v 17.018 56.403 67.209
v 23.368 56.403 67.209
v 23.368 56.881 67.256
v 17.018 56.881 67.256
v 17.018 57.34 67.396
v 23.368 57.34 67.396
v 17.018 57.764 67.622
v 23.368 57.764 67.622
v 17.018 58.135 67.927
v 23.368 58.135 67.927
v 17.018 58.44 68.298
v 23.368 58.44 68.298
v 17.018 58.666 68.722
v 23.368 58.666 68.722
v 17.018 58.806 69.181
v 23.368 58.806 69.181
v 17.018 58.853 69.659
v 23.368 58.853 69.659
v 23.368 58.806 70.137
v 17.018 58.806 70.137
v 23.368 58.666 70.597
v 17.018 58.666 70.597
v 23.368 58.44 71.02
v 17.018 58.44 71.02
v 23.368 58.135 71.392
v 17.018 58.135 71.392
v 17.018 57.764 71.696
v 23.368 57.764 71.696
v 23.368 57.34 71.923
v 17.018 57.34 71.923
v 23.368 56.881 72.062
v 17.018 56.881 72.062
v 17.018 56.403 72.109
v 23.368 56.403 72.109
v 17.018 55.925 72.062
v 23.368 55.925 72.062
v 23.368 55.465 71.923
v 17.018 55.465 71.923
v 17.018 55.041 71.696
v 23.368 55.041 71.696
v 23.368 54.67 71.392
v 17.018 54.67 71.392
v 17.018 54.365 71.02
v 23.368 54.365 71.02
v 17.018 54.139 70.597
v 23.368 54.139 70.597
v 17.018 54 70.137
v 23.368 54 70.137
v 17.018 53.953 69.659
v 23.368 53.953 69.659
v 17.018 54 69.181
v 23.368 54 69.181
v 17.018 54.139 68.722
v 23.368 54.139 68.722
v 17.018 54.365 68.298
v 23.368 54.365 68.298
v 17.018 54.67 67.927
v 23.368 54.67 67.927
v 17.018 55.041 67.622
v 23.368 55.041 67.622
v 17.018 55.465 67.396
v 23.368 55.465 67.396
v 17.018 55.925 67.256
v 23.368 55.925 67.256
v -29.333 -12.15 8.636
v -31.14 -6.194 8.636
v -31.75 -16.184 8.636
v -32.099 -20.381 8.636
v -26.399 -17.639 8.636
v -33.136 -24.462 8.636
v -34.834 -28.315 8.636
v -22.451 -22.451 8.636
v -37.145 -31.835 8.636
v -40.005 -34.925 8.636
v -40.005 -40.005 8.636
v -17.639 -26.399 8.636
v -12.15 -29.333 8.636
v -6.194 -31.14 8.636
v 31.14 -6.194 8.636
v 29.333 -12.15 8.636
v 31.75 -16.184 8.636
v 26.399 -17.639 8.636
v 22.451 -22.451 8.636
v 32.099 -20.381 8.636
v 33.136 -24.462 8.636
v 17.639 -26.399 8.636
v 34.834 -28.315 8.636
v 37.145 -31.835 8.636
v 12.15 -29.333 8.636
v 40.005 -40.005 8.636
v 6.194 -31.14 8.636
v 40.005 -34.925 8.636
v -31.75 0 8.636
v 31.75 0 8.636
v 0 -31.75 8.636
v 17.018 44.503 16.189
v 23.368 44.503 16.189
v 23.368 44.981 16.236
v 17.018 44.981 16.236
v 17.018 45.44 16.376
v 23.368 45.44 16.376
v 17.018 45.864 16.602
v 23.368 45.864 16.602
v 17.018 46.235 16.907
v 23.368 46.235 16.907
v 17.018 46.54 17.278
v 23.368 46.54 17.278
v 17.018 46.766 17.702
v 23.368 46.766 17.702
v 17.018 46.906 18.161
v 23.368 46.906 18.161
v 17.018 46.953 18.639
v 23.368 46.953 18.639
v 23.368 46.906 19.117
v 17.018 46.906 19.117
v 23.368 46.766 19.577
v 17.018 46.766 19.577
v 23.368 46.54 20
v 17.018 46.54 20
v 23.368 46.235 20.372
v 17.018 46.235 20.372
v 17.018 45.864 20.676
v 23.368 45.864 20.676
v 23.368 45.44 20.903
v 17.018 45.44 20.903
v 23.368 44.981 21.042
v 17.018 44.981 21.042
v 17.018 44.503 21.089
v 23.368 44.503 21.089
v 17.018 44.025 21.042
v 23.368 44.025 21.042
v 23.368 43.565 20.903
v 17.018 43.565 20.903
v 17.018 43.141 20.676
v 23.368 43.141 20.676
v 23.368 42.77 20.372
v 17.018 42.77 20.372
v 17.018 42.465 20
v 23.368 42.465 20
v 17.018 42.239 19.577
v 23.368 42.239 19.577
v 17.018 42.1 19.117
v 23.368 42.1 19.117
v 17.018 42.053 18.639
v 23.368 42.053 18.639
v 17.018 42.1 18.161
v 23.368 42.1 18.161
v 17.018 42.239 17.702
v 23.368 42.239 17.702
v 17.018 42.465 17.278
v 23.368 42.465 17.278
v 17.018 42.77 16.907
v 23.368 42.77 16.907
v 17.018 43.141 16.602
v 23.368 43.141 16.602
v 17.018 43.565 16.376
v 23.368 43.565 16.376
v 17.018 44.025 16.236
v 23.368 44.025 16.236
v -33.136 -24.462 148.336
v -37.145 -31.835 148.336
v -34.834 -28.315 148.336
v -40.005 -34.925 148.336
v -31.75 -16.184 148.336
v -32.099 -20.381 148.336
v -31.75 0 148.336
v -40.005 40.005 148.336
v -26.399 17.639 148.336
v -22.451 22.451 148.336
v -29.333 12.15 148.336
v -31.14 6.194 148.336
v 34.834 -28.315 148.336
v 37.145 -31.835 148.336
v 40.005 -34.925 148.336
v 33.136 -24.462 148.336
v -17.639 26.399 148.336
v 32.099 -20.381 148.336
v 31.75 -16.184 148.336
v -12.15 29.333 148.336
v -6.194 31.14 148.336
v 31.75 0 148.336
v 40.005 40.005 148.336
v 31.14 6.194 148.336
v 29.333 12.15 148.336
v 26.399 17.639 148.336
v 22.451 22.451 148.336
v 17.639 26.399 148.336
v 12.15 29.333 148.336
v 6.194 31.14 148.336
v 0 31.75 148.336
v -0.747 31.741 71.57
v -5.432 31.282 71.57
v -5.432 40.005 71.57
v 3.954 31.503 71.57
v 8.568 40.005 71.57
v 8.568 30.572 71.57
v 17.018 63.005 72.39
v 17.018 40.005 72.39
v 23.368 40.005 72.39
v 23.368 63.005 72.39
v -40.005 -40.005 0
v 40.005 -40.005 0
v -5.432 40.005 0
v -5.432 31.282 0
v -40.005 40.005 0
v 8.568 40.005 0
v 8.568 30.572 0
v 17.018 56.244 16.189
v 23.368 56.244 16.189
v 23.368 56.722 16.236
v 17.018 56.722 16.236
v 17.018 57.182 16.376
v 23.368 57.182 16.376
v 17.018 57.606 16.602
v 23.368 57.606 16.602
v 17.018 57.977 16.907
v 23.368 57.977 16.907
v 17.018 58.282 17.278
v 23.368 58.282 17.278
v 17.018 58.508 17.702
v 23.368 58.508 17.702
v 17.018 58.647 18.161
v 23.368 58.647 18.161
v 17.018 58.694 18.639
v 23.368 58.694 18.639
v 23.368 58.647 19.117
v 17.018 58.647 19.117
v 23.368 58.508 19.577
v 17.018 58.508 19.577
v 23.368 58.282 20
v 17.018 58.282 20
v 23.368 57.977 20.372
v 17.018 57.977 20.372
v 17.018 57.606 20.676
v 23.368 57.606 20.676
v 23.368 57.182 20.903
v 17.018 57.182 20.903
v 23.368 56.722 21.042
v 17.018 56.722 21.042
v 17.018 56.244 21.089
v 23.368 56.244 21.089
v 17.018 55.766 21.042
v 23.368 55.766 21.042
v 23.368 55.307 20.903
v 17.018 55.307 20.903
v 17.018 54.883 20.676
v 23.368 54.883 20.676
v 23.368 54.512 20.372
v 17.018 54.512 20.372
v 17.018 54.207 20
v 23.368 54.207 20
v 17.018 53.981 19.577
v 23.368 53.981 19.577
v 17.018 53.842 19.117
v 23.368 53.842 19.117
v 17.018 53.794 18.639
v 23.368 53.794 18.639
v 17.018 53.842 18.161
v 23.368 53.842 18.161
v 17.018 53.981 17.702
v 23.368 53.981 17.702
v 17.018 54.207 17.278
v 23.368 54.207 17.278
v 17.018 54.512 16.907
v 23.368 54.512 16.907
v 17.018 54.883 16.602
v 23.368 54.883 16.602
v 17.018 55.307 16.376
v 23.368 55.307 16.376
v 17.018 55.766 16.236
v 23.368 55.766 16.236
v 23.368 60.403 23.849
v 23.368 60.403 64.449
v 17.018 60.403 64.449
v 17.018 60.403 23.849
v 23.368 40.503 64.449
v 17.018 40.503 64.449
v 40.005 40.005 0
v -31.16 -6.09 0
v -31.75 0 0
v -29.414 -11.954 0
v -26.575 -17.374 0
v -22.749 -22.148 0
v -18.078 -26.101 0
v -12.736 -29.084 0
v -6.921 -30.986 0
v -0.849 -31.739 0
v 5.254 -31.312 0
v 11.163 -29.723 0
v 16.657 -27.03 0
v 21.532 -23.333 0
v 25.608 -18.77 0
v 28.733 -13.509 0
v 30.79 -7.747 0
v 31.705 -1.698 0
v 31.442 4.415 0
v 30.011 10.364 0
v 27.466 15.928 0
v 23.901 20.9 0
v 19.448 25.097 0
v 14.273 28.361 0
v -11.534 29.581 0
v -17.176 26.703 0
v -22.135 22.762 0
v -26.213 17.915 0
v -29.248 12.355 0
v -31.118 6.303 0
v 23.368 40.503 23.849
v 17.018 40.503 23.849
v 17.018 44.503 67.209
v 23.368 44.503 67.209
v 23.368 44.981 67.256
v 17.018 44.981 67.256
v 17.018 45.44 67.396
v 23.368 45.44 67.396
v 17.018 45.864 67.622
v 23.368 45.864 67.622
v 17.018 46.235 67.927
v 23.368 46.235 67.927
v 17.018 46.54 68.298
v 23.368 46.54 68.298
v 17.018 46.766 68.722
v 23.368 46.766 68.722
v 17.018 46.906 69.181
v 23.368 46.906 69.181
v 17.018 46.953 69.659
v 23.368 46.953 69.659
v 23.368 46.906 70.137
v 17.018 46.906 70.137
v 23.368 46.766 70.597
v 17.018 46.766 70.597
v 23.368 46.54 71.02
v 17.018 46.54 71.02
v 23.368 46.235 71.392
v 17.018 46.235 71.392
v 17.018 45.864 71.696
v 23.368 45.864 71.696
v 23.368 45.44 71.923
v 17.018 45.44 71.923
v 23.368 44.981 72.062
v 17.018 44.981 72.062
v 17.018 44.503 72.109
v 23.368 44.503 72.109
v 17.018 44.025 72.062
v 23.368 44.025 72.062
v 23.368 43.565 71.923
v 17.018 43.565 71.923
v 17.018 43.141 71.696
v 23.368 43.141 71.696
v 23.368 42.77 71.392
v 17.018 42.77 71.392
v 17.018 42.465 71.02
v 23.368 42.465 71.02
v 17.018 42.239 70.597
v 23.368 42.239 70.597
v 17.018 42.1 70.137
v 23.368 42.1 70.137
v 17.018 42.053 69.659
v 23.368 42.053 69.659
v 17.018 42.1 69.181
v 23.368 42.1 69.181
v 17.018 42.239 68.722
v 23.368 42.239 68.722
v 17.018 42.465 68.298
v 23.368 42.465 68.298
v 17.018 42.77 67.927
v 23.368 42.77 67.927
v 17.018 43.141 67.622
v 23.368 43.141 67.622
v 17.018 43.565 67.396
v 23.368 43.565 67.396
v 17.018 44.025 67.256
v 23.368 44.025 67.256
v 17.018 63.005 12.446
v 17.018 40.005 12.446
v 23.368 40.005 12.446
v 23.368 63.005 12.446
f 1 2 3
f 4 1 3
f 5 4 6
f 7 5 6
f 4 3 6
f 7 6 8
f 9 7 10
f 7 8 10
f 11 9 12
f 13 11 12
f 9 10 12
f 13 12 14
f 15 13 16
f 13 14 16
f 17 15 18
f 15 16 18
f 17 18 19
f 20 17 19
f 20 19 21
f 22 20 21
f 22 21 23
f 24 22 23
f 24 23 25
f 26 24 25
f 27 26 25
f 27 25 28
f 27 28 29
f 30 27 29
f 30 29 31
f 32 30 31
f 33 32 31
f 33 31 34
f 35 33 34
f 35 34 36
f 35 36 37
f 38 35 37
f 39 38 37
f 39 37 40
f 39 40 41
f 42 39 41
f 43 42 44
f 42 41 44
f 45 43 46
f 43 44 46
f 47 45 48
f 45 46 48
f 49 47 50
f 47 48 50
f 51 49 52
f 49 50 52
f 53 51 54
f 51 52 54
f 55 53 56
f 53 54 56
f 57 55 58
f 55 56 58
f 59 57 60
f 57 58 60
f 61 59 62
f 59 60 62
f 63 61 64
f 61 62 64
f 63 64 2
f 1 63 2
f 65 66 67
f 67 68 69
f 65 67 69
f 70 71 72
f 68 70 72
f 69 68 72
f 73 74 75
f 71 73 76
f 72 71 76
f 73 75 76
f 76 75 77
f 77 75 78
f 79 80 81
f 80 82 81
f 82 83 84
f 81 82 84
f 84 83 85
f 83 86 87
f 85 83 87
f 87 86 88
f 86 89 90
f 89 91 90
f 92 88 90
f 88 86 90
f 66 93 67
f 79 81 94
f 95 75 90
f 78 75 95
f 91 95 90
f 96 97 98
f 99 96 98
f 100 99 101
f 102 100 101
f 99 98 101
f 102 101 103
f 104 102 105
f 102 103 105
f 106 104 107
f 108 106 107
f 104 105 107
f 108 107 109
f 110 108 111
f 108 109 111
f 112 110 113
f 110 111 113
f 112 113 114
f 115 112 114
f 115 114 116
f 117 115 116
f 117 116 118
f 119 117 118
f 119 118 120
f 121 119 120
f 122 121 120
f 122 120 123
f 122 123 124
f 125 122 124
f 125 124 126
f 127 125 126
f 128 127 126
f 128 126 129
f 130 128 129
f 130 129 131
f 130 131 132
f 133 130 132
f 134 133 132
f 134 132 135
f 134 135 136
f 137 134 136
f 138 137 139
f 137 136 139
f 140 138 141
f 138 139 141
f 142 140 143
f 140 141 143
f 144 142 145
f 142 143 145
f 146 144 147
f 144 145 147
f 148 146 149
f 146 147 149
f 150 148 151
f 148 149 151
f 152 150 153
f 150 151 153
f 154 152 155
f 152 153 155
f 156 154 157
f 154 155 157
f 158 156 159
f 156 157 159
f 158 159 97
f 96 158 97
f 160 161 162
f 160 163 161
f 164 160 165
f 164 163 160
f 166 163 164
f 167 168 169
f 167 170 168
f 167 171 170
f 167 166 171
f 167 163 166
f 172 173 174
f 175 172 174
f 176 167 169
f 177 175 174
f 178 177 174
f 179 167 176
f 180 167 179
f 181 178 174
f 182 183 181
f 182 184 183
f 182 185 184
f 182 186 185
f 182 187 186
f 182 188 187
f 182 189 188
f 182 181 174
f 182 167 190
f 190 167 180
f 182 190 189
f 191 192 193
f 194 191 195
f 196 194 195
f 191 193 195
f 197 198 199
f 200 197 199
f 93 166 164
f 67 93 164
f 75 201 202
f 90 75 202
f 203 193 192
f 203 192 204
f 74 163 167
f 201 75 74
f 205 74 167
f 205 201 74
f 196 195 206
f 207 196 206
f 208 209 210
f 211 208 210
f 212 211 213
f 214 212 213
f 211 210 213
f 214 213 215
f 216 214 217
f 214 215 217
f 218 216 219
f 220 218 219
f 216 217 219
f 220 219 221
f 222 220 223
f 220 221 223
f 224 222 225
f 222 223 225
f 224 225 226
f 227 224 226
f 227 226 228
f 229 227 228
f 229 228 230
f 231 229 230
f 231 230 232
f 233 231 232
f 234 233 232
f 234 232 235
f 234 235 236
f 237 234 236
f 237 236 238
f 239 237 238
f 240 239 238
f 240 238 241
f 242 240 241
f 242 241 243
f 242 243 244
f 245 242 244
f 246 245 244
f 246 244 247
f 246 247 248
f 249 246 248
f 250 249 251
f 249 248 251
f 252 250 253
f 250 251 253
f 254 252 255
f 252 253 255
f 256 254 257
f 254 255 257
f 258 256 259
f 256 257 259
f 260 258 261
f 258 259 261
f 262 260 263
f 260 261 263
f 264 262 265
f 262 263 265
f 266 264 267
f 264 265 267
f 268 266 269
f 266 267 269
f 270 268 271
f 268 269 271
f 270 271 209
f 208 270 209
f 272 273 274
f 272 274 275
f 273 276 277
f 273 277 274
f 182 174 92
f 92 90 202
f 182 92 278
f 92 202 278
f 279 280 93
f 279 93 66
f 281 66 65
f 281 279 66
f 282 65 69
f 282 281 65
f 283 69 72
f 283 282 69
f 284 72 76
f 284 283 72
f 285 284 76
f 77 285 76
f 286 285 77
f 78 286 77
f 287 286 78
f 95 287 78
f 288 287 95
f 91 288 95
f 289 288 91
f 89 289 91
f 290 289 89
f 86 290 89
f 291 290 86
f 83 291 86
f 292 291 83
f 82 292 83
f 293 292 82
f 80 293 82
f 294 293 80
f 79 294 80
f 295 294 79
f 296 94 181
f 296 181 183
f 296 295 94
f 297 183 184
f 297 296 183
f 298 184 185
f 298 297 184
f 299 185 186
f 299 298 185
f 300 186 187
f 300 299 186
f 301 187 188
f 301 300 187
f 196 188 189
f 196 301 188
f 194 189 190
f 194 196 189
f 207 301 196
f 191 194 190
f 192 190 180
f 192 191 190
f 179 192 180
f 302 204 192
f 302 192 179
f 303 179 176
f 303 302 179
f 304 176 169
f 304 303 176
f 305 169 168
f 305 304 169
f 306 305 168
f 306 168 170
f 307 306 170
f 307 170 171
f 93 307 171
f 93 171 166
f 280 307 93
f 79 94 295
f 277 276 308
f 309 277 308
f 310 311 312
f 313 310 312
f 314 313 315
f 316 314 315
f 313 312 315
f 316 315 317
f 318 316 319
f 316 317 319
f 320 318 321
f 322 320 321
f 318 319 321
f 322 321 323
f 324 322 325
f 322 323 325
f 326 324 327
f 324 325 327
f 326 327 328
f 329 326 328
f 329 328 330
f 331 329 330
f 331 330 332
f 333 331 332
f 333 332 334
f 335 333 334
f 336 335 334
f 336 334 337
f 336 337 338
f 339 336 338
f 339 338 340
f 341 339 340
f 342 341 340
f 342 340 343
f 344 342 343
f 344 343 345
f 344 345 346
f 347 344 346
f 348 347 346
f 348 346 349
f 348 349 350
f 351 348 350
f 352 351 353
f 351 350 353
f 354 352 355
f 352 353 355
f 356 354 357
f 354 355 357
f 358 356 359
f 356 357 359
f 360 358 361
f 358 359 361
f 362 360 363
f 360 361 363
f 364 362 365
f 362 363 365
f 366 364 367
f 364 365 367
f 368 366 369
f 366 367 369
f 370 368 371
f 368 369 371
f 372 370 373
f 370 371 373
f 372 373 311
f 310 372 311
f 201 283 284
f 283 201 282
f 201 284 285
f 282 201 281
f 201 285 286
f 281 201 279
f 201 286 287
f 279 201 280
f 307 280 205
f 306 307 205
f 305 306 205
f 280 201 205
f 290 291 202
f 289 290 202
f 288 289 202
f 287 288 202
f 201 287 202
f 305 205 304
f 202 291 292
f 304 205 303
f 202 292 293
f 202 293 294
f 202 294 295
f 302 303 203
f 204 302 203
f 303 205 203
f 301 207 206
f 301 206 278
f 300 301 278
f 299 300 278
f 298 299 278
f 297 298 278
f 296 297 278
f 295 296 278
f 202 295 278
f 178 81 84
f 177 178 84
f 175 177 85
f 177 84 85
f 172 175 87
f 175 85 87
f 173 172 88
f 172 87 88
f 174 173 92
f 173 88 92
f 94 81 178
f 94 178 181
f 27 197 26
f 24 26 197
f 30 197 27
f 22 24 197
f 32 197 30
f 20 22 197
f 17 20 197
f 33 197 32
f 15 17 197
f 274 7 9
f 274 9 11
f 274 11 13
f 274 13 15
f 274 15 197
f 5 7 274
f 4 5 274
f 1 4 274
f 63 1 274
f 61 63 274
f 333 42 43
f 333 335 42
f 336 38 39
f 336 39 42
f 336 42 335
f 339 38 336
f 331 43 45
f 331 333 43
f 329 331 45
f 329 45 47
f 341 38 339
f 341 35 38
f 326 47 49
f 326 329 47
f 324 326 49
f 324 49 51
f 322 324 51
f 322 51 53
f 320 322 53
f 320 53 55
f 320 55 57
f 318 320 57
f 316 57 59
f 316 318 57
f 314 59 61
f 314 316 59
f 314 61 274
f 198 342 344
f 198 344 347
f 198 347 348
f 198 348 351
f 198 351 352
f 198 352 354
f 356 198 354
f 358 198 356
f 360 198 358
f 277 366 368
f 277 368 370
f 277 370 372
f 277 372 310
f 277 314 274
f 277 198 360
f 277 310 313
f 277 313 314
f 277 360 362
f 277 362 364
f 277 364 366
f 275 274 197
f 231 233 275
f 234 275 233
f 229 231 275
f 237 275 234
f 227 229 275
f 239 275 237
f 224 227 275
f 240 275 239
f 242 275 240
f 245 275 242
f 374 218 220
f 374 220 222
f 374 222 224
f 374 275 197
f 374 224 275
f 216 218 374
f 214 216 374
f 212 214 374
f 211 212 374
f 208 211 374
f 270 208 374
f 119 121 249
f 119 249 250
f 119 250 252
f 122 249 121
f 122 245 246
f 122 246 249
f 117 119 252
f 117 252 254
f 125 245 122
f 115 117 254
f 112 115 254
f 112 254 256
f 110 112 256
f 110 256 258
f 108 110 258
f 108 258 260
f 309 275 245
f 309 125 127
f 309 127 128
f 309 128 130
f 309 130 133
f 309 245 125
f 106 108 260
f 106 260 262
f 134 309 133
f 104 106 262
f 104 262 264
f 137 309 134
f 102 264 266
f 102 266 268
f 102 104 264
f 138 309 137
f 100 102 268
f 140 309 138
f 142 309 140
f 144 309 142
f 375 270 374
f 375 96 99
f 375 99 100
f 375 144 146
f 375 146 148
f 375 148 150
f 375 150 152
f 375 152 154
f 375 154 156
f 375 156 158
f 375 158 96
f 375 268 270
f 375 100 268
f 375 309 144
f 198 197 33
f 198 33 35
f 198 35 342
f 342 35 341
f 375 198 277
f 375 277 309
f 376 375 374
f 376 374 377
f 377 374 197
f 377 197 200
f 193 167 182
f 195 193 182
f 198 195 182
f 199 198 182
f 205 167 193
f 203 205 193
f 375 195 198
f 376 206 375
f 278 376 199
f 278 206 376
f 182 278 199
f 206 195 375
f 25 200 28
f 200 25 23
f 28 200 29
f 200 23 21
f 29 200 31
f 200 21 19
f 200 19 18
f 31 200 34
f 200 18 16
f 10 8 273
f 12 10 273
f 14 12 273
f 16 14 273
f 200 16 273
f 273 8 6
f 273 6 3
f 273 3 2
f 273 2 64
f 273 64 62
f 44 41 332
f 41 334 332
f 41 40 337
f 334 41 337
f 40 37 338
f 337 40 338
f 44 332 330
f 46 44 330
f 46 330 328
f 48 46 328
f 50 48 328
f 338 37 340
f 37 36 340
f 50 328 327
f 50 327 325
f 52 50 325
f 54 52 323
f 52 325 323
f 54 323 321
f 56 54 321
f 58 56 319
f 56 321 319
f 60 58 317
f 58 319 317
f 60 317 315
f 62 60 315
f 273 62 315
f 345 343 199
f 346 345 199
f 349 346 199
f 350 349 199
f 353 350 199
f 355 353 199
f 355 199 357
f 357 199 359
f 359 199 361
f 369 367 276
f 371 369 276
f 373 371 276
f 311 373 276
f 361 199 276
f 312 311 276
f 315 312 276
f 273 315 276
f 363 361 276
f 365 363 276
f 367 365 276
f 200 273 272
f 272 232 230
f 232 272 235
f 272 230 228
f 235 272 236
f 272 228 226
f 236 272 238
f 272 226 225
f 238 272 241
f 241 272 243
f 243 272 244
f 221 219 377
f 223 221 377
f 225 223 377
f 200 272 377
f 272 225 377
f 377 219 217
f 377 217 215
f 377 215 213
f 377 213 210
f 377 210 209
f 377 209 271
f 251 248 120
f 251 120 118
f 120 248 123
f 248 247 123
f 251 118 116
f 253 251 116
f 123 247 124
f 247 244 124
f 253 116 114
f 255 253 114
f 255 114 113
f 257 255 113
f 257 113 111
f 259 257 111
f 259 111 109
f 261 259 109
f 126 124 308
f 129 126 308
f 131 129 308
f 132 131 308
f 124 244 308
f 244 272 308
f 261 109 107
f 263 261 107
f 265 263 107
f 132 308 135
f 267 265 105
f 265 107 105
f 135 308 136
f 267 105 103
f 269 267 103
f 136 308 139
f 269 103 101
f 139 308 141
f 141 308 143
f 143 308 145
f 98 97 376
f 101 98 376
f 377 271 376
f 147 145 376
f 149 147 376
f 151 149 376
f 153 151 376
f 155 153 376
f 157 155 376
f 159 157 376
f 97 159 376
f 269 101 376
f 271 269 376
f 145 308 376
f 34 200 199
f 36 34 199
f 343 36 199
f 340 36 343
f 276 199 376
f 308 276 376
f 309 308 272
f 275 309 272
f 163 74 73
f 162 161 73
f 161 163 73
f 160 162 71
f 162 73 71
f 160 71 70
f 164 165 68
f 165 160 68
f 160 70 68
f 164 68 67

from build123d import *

# Parameters (mm, degrees)
SKETCH1_W           = 80.01
SKETCH1_H           = 80.01
BOSS_EXTRUDE1_DEPTH = 2.54
SKETCH2_W           = 80.01
SKETCH2_H           = 80.01
SKETCH2_W_2         = 69.85
SKETCH2_H_2         = 69.85
BOSS_EXTRUDE2_DEPTH = 145.796
SKETCH3_R           = 31.75
CUT_EXTRUDE1_DEPTH  = 69.85
SKETCH5_W           = 80.01
SKETCH5_H           = 139.7
CUT_EXTRUDE3_DEPTH  = 5.08
SKETCH6_W           = 69.85
SKETCH6_H           = 69.85
SKETCH6_R           = 31.75
BOSS_EXTRUDE3_DEPTH = 145.796
CUT_EXTRUDE5_START  = -139.7
CUT_EXTRUDE5_DEPTH  = 139.7
FILLET2_R           = 25.4
SKETCH9_W           = 6.35
SKETCH9_H           = 59.944
BOSS_EXTRUDE5_DEPTH = 23
SKETCH10_R          = 2.45
SKETCH10_W          = 40.6
SKETCH10_H          = 19.9
CUT_EXTRUDE7_DEPTH  = 23
SKETCH12_W          = 14
SKETCH12_H          = 72
CUT_EXTRUDE10_DEPTH = 24.13


with BuildPart() as part:
    # Sketch1 → Boss-Extrude1 (new body)
    with BuildSketch(Plane.XY):
        Rectangle(SKETCH1_W, SKETCH1_H)
    extrude(amount=BOSS_EXTRUDE1_DEPTH)

    # Sketch2 → Boss-Extrude2 (add)
    with BuildSketch(Plane.XY.offset(2.54)):
        Rectangle(SKETCH2_W, SKETCH2_H)
        Rectangle(SKETCH2_W_2, SKETCH2_H_2, mode=Mode.SUBTRACT)
    extrude(amount=BOSS_EXTRUDE2_DEPTH)

    # Sketch3 → Cut-Extrude1 (cut)
    with BuildSketch(Plane(origin=(0, 0, 0), x_dir=(-1, 0, 0), z_dir=(0, 0, -1))):
        Circle(SKETCH3_R)
    extrude(amount=-CUT_EXTRUDE1_DEPTH, mode=Mode.SUBTRACT)

    # Sketch5 → Cut-Extrude3 (cut)
    with BuildSketch(Plane.XZ.offset(40.005)):
        with Locations((0, 78.486)):
            Rectangle(SKETCH5_W, SKETCH5_H)
    extrude(amount=-CUT_EXTRUDE3_DEPTH, mode=Mode.SUBTRACT)

    # Sketch6 → Boss-Extrude3 (add)
    with BuildSketch(Plane.XY.offset(2.54)):
        Rectangle(SKETCH6_W, SKETCH6_H)
        with Locations(Location((0, 0, 0), (0, 0, 180))):
            Circle(SKETCH6_R, mode=Mode.SUBTRACT)
    extrude(amount=BOSS_EXTRUDE3_DEPTH)

    # Sketch8 → Cut-Extrude5 (cut)
    with BuildSketch(Plane.XY.offset(148.336).offset(CUT_EXTRUDE5_START)):
        with BuildLine():
            ThreePointArc((31.75, 0), (0, -31.75), (-31.75, 0))
            Line((-31.75, 0), (-31.75, -34.925))
            Line((-31.75, -34.925), (31.75, -34.925))
            Line((31.75, -34.925), (31.75, 0))
        make_face()
    extrude(amount=CUT_EXTRUDE5_DEPTH, mode=Mode.SUBTRACT)

    # Fillet2
    # the kernel refuses this fillet: 25.4 mm, written as the material it takes off along each edge
    with BuildSketch(Plane(origin=(31.75, -34.925, 8.636), x_dir=(1, 0, 0), z_dir=(0, 0, 1))) as fillet2_piece_1:
        with BuildLine():
            CenterArc((25.4, 18.740570295), FILLET2_R, 180, 47.545849796)
            Line((0, 18.740570295), (0, 0))
            Line((0, 0), (8.255, 0))
        make_face()
    extrude(amount=186.551425739, mode=Mode.SUBTRACT)
    with BuildSketch(Plane(origin=(-31.75, -34.925, 8.636), x_dir=(0, 1, 0), z_dir=(0, 0, 1))) as fillet2_piece_2:
        with BuildLine():
            CenterArc((18.740570295, 25.4), FILLET2_R, 222.454150204, 47.545849796)
            Line((0, 8.255), (0, 0))
            Line((0, 0), (18.740570295, 0))
        make_face()
    extrude(amount=186.551425739, mode=Mode.SUBTRACT)

    # Sketch9 → Boss-Extrude5 (add)
    with BuildSketch(Plane(origin=(0, 40.005, 0), x_dir=(1, 0, 0), z_dir=(0, 1, 0))):
        with Locations((20.193, -42.418)):
            Rectangle(SKETCH9_W, SKETCH9_H)
    extrude(amount=BOSS_EXTRUDE5_DEPTH)

    # Sketch10 → Cut-Extrude7 (cut)
    with BuildSketch(Plane(origin=(23.368, 0, 0), x_dir=(0, 0, -1), z_dir=(1, 0, 0))):
        with Locations((-69.659214709, 44.502596375)):
            Circle(SKETCH10_R)
        with Locations((-69.659214709, 56.402596375)):
            Circle(SKETCH10_R)
        with Locations((-18.639214709, 44.502596375)):
            Circle(SKETCH10_R)
        with Locations((-18.639214709, 56.244452771)):
            Circle(SKETCH10_R)
        with Locations((-44.149214709, 50.452596375)):
            Rectangle(SKETCH10_W, SKETCH10_H)
    extrude(amount=-CUT_EXTRUDE7_DEPTH, mode=Mode.SUBTRACT)

    # Sketch12 → Cut-Extrude10 (cut)
    with BuildSketch(Plane(origin=(0, 40.005, 0), x_dir=(1, 0, 0), z_dir=(0, 1, 0))):
        with Locations((1.568, -35.570235268)):
            Rectangle(SKETCH12_W, SKETCH12_H)
    extrude(amount=-CUT_EXTRUDE10_DEPTH, mode=Mode.SUBTRACT)


solid = part.part
